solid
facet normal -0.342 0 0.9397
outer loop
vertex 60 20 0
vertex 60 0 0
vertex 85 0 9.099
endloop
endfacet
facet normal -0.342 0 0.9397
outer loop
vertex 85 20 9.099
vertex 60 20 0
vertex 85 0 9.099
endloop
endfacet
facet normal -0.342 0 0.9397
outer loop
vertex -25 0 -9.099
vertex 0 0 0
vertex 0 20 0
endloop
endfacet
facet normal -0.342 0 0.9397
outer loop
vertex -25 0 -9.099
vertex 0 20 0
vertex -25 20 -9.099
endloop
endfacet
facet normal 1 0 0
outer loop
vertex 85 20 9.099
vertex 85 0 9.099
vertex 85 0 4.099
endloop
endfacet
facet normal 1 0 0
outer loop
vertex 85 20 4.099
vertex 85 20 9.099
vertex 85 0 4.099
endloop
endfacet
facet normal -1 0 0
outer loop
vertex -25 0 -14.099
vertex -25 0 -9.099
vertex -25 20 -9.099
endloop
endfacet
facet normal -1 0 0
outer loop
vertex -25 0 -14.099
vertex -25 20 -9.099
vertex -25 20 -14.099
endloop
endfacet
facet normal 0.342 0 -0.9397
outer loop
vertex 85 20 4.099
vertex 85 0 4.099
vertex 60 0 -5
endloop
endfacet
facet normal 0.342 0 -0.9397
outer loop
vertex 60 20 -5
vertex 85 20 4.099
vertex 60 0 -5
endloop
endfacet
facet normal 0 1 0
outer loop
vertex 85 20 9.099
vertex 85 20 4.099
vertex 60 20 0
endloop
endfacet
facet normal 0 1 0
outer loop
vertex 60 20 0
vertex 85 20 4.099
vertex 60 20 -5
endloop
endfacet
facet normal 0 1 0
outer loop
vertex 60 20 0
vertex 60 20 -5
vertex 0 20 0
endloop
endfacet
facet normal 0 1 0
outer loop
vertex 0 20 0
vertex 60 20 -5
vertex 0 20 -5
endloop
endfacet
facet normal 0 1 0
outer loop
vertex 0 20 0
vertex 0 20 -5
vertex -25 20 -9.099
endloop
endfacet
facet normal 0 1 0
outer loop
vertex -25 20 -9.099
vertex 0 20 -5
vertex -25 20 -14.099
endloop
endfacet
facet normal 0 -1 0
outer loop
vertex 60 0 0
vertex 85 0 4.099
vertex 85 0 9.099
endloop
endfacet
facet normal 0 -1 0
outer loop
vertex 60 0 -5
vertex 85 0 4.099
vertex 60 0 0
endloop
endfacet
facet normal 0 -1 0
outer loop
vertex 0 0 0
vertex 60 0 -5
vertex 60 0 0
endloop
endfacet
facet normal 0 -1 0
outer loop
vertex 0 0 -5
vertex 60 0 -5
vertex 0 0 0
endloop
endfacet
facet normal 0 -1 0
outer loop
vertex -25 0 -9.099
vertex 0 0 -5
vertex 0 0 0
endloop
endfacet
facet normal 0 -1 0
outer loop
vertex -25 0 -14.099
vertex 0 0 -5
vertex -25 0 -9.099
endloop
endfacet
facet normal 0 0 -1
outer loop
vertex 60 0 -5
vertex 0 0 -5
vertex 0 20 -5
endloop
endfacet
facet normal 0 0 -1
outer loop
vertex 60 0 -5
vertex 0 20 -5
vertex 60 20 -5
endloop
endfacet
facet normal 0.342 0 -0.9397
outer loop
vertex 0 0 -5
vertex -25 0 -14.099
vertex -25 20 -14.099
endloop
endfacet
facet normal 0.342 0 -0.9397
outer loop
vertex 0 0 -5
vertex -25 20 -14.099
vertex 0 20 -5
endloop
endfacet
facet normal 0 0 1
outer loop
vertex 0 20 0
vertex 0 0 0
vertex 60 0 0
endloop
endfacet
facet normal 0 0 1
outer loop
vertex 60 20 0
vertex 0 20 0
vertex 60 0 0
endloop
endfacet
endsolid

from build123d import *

# Parameters (mm, degrees)
SKETCH_1_W      = 60
SKETCH_1_H      = 5
EXTRUDE_1_DEPTH = 20


with BuildPart() as part:
    # 草图1 → 凸台-拉伸1 (new body)
    with BuildSketch(Plane(origin=(0, 0, 0), x_dir=(1, 0, 0), z_dir=(0, 1, 0))):
        Polygon((-25, 9.099255857), (-25, 14.099255857), (0, 5), (0, 0), align=None)
        with Locations((30, 2.5)):
            Rectangle(SKETCH_1_W, SKETCH_1_H)
        Polygon((60, 0), (85, -9.099255857), (85, -4.099255857), (60, 5), align=None)
    extrude(amount=EXTRUDE_1_DEPTH)


solid = part.part
